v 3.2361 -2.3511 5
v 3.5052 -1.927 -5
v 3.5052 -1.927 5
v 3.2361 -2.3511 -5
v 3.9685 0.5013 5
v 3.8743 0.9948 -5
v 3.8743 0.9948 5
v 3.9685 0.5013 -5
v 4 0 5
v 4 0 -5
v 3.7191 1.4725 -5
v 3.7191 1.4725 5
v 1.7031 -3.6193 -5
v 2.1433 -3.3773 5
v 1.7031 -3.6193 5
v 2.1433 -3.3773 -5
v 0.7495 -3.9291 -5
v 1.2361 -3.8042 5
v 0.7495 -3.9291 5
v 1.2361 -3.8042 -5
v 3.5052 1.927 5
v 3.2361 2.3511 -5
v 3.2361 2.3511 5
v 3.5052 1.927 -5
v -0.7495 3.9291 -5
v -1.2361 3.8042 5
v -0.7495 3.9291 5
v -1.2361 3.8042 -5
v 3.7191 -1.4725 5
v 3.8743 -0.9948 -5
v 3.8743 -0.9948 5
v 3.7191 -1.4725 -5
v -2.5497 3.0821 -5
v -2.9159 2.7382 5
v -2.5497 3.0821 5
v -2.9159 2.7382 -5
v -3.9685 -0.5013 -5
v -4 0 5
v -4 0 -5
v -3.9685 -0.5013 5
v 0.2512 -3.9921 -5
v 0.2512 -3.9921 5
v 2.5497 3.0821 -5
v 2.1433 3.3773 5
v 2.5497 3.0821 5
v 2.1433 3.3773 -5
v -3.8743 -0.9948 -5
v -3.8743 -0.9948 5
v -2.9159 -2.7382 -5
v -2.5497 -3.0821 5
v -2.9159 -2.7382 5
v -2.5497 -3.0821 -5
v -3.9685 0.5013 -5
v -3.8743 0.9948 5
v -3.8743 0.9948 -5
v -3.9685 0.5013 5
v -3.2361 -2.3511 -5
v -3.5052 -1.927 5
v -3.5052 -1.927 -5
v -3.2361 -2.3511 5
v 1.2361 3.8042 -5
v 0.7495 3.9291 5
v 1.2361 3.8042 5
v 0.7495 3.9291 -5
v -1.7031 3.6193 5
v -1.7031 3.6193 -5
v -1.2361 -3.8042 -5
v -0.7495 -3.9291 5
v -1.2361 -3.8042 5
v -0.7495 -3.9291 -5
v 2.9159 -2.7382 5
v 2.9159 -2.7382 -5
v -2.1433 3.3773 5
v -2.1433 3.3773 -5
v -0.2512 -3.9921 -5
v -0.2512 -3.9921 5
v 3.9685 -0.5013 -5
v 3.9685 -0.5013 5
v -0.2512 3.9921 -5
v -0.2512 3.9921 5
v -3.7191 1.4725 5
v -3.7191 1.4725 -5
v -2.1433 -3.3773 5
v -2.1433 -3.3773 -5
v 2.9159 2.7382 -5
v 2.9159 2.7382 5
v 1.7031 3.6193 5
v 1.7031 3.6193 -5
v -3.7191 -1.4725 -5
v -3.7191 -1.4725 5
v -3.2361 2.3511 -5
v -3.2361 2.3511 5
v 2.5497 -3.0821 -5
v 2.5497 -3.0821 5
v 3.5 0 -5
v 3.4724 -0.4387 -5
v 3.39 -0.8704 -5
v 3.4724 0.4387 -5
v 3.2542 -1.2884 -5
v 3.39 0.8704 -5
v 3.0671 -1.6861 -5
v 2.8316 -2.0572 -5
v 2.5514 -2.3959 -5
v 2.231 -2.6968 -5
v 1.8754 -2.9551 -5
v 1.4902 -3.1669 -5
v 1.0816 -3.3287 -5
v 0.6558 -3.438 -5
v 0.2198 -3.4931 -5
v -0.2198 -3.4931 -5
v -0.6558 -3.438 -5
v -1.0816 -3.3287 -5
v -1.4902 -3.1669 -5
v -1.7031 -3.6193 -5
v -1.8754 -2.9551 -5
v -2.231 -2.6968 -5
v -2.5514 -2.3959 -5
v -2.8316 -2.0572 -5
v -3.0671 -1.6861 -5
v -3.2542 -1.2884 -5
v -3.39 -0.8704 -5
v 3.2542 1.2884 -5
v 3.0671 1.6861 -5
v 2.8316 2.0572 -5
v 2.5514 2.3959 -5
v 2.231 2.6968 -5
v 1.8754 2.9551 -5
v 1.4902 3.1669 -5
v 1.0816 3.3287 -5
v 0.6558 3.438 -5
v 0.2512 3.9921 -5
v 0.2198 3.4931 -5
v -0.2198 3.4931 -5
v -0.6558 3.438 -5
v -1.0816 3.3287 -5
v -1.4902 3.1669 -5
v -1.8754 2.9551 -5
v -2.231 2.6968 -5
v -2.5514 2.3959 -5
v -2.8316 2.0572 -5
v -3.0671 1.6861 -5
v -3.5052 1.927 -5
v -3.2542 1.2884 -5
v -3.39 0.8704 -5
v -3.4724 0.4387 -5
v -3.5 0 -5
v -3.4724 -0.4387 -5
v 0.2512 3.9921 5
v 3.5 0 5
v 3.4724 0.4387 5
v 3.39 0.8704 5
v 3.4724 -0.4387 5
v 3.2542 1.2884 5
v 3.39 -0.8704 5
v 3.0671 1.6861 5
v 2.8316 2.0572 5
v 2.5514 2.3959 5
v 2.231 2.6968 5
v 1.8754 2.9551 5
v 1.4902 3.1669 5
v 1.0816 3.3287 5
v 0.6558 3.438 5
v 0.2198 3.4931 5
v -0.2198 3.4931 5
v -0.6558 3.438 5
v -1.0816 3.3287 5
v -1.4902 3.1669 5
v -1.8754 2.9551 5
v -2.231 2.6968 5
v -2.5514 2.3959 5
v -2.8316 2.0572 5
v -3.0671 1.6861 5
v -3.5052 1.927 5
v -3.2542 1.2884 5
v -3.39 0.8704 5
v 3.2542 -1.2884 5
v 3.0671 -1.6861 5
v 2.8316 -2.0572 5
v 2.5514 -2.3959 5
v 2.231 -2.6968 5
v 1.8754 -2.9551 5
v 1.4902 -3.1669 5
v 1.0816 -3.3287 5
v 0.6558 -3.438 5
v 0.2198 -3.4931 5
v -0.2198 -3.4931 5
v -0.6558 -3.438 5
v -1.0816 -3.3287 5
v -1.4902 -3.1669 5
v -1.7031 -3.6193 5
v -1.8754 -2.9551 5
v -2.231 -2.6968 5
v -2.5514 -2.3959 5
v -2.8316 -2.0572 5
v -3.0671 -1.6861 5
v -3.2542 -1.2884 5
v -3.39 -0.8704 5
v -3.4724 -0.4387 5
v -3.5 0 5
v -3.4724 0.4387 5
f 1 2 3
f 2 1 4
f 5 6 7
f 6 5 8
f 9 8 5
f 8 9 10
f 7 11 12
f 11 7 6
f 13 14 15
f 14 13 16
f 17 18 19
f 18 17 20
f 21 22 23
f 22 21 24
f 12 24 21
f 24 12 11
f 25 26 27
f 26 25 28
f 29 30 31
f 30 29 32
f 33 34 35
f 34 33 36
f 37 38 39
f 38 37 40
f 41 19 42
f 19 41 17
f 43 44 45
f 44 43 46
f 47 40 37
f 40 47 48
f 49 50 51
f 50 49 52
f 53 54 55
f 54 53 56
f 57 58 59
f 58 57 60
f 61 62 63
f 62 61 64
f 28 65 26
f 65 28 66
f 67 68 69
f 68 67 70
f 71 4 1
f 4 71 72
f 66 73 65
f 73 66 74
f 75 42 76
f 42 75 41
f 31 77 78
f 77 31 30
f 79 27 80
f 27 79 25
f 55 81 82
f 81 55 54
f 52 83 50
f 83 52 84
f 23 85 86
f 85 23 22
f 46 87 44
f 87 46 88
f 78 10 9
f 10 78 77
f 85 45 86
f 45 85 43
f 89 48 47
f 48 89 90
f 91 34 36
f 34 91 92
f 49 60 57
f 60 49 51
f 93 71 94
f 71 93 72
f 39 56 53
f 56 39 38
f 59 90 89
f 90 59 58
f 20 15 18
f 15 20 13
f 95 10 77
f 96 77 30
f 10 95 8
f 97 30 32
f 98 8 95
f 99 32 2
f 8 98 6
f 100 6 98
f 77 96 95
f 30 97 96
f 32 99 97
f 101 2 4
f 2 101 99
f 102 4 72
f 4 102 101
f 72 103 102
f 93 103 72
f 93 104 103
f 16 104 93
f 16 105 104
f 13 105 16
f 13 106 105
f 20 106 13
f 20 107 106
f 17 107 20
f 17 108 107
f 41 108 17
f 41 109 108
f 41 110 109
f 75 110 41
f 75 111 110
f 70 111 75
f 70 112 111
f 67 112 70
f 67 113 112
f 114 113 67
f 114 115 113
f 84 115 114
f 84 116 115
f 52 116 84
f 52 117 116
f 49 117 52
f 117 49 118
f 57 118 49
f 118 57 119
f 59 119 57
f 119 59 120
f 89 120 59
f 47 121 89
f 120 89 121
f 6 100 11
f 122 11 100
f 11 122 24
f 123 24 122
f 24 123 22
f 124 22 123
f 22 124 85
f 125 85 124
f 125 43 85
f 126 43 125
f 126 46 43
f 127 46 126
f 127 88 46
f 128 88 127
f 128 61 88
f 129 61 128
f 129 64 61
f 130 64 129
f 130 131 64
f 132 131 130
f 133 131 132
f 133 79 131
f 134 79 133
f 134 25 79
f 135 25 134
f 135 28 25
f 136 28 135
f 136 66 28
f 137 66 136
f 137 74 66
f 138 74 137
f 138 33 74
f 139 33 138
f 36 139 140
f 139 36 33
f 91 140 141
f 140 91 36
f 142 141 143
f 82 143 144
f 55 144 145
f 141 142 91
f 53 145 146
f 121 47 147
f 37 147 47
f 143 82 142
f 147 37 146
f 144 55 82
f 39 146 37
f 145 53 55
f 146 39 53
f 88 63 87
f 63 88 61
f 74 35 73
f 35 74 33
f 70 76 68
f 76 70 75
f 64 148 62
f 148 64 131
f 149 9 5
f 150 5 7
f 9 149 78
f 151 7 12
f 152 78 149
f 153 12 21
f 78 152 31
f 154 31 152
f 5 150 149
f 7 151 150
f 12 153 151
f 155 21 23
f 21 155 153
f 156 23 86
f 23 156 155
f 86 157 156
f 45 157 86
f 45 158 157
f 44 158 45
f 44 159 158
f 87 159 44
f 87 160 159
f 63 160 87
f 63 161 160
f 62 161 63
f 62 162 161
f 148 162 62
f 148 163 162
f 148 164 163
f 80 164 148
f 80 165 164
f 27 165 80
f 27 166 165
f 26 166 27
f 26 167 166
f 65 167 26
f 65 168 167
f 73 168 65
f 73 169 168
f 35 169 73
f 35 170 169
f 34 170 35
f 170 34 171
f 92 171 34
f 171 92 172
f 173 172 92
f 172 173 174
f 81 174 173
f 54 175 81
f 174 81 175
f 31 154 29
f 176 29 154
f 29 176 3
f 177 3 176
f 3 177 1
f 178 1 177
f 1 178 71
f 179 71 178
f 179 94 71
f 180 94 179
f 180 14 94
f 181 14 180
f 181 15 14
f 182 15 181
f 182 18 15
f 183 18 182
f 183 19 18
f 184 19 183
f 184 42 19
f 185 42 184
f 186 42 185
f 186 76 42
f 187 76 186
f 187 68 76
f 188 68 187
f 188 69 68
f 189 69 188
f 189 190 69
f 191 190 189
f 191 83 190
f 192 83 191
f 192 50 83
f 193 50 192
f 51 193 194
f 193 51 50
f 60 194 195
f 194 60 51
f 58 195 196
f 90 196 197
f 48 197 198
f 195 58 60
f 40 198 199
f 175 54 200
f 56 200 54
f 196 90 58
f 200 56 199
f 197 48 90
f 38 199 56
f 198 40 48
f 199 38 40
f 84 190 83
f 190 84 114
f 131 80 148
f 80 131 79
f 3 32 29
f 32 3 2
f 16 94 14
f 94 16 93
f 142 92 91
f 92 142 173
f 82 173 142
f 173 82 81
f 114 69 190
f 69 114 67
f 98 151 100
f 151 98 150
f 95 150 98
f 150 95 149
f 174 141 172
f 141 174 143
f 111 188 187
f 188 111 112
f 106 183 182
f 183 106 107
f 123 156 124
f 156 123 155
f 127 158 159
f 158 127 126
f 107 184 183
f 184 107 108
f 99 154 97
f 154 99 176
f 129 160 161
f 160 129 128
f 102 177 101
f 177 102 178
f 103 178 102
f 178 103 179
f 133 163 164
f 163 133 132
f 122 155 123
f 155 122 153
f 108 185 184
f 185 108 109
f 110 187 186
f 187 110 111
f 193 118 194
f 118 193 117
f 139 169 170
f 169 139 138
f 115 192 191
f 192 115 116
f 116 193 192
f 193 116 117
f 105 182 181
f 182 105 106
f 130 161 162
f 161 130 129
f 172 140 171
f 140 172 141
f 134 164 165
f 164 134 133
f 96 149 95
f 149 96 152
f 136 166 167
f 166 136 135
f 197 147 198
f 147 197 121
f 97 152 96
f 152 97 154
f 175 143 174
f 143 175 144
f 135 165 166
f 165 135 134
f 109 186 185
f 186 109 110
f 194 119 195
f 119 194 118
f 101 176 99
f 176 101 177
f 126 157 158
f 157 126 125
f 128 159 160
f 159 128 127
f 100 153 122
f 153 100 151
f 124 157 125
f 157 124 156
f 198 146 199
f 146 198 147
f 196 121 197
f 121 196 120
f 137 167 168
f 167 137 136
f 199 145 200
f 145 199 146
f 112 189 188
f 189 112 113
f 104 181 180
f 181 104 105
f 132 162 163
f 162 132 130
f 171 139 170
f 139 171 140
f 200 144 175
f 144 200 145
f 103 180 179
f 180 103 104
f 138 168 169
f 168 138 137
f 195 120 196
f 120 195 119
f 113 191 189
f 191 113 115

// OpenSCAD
$fn = 50;


difference() {
	union() {
		translate(v = [0, 0, -5.0000000000]) {
			cylinder(h = 10, r = 4.0000000000);
		}
	}
	union() {
		translate(v = [0, 0, -100.0000000000]) {
			cylinder(h = 200, r = 3.5000000000);
		}
	}
}
